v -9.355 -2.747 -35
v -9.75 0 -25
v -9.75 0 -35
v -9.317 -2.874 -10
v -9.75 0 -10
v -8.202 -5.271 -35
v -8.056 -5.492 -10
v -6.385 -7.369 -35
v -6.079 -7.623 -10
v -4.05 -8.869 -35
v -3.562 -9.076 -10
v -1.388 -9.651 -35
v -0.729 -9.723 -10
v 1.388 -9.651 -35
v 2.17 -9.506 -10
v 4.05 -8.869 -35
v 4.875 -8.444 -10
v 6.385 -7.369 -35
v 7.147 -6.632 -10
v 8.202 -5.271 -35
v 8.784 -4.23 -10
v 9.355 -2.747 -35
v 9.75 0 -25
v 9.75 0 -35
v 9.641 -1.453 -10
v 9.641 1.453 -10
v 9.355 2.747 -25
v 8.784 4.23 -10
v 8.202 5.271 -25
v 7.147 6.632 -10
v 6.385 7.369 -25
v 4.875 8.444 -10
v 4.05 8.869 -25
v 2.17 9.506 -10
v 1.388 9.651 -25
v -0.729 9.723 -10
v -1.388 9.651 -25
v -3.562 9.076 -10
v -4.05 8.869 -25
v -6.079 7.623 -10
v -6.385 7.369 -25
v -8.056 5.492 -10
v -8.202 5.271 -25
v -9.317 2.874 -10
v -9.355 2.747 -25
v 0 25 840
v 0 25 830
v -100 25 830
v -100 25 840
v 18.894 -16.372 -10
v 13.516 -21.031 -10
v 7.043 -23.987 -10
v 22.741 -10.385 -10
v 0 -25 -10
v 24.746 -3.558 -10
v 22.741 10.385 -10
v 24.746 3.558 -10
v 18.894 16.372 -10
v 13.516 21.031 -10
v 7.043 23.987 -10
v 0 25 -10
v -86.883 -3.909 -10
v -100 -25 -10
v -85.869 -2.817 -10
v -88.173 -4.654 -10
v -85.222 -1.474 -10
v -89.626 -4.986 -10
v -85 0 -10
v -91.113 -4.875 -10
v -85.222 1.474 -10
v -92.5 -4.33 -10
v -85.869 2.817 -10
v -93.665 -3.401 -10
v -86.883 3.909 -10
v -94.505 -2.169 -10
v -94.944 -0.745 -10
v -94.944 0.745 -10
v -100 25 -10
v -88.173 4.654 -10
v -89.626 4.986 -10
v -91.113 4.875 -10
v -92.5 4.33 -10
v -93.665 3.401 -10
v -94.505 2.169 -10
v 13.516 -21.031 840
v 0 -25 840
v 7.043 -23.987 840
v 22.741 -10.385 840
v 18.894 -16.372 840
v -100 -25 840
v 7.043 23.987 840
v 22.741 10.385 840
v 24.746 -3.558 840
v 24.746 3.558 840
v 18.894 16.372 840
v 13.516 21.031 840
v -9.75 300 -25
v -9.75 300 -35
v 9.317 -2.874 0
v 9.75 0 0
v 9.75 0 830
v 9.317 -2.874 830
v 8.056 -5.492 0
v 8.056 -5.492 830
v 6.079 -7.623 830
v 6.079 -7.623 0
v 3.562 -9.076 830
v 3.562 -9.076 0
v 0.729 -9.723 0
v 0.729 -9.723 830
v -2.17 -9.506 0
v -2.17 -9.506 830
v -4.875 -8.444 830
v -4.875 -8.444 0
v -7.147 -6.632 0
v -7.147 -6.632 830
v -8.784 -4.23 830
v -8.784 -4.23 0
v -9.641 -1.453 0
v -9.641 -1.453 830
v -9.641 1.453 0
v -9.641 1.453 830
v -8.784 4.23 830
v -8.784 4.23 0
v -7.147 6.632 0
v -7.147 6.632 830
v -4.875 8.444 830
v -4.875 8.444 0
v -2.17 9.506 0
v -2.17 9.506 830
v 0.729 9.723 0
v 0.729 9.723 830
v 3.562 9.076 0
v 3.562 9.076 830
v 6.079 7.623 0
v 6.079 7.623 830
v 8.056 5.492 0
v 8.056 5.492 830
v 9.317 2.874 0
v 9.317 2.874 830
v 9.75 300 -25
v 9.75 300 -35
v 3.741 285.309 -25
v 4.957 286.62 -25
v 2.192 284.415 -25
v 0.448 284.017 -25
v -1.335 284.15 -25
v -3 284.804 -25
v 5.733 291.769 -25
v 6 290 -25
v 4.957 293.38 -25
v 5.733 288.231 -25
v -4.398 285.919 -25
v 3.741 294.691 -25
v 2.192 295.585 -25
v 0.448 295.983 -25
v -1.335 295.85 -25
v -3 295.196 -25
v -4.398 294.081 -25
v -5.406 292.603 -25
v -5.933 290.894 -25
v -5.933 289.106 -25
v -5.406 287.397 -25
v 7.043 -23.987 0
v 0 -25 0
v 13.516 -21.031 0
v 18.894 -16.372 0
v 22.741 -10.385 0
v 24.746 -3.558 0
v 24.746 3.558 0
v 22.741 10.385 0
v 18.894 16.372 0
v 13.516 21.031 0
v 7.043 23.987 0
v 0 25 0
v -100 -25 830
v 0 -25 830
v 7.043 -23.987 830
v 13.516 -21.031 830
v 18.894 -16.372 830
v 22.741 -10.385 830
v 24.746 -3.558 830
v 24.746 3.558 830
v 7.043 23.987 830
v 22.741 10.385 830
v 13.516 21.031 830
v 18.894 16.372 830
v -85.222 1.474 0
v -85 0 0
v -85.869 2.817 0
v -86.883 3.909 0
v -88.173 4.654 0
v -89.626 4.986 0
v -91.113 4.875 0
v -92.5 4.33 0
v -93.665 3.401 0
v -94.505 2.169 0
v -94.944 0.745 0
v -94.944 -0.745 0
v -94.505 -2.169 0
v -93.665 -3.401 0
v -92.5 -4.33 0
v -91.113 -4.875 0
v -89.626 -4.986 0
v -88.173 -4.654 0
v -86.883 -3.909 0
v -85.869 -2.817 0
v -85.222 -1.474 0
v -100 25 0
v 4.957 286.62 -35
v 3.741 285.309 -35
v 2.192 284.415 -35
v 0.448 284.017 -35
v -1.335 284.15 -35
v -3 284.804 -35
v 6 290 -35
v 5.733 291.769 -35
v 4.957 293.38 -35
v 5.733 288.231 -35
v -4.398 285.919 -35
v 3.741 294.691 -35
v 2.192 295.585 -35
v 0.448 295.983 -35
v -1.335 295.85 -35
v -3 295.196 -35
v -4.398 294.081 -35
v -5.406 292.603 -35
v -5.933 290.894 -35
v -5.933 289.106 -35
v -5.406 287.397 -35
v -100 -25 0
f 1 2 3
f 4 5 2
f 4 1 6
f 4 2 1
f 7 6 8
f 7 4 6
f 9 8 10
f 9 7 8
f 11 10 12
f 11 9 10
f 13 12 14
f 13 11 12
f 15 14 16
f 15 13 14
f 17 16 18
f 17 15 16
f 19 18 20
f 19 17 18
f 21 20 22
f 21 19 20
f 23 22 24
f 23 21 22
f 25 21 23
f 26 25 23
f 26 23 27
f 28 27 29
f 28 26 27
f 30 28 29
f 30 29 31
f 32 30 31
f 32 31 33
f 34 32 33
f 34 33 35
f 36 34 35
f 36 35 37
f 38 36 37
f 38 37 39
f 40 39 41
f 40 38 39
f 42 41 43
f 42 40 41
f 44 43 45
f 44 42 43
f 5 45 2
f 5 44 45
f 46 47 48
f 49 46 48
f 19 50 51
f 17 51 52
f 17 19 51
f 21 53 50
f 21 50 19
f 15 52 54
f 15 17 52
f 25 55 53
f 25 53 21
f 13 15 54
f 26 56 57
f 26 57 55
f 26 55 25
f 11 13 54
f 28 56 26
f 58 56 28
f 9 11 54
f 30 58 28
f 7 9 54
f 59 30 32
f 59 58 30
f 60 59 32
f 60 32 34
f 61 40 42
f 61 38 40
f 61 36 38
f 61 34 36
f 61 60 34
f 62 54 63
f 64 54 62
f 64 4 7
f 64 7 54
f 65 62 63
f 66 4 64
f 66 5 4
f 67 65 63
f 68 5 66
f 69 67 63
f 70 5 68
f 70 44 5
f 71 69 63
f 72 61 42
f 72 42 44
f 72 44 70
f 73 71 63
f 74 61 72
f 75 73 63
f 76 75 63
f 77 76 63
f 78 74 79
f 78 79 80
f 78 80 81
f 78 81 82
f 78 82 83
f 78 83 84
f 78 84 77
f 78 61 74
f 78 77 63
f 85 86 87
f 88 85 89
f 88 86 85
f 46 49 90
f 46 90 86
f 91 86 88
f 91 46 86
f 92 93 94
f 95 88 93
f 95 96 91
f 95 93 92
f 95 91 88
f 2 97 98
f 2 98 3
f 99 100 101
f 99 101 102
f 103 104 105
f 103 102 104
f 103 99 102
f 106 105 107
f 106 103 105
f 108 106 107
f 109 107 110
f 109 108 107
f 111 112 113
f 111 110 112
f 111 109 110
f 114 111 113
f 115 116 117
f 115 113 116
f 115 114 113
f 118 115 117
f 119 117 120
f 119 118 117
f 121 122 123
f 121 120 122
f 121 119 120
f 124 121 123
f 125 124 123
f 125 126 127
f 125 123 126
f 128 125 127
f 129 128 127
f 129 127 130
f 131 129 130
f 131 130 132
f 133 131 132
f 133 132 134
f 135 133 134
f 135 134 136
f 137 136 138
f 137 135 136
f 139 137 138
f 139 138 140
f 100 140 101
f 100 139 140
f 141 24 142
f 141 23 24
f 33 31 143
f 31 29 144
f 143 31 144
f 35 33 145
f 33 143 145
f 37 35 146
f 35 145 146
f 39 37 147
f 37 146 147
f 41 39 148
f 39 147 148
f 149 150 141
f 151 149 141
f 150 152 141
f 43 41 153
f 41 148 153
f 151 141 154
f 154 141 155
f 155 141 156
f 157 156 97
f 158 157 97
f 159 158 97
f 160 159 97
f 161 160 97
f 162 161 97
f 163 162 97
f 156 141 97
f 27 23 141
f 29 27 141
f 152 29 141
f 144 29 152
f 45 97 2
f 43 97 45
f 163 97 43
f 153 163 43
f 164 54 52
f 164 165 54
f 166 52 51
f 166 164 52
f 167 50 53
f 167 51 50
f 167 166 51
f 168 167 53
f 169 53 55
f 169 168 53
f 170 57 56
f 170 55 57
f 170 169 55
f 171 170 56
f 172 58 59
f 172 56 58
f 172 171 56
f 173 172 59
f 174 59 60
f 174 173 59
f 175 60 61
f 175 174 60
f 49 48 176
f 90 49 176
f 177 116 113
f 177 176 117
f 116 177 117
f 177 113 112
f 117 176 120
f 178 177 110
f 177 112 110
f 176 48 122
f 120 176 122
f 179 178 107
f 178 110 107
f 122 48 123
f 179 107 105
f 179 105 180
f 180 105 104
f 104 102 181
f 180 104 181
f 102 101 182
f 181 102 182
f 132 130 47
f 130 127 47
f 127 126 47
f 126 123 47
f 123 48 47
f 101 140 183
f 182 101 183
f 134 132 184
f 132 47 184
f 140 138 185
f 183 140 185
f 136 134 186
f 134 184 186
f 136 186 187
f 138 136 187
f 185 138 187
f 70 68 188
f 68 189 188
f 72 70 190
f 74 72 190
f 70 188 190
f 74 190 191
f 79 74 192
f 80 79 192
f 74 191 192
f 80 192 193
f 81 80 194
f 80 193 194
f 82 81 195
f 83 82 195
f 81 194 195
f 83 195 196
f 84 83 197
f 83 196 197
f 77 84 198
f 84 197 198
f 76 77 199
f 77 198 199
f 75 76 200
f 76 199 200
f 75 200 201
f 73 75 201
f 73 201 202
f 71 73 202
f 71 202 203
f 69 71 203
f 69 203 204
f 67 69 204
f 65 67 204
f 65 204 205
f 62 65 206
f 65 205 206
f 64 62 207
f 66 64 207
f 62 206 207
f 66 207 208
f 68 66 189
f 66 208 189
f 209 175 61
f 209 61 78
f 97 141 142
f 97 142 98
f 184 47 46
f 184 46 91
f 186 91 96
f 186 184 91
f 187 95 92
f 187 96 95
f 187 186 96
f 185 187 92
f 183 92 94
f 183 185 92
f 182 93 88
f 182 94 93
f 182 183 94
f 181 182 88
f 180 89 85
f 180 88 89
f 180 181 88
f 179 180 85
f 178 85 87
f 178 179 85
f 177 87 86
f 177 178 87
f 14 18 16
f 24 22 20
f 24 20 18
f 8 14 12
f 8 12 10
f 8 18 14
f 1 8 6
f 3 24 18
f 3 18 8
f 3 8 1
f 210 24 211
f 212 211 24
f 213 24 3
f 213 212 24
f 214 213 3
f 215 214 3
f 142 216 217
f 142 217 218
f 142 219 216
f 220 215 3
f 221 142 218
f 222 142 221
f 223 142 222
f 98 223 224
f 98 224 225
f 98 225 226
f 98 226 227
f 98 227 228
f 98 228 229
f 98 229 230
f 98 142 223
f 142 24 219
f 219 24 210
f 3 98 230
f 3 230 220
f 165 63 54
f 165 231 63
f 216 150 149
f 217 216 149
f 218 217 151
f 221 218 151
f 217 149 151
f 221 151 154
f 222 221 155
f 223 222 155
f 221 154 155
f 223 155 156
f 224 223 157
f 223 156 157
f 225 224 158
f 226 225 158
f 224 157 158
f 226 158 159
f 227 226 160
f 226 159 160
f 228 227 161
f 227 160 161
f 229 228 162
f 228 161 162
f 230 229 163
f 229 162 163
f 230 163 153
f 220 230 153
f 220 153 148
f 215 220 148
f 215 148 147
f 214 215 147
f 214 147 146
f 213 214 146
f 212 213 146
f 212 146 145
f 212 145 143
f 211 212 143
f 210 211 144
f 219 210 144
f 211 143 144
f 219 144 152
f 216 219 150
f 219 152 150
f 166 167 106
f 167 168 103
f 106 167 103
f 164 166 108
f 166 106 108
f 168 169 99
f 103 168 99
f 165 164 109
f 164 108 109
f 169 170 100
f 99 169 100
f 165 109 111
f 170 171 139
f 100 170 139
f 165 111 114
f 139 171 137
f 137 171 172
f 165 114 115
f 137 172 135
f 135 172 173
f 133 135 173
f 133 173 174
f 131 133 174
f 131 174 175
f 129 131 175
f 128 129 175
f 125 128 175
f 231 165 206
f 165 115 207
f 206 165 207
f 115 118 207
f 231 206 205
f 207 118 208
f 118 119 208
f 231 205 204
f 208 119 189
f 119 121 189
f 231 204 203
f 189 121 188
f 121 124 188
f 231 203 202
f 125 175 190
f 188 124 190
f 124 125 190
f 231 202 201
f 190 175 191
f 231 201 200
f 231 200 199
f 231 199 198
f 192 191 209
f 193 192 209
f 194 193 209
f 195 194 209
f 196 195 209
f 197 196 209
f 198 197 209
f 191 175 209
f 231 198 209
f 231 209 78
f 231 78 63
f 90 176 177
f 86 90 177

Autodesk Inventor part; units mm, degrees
ref_plane "YZ Plane" through (0, 0, 0) normal (1, 0, 0) x (0, 1, 0)
ref_plane "XZ Plane" through (0, 0, 0) normal (0, 1, 0) x (-1, 0, 0)
ref_plane "XY Plane" through (0, 0, 0) normal (0, 0, 1) x (1, 0, 0)
sketch "Skizze1" plane through (0, 0, 0) normal (0, 0, 1) x (1, 0, 0)
  circle A0 centre (0, 0) radius 9.75
  dimension "d0" = 19.5
extrude "Extrusion1" add sketch "Skizze1" along normal blind 830
sketch "Skizze4" plane through (0, 0, 830) normal (0, 0, 1) x (1, 0, 0)
  arc A0 (0, -25) -> (0, 25) centre (0, 0) ccw
  line L0 (0, 0) -> (0, -25) construction
  line L1 (0, 0) -> (0, 27.5151) construction
  line L2 (0, 25) -> (-100, 25)
  line L3 (-100, 25) -> (-100, -25)
  line L4 (-100, -25) -> (0, -25)
  point P0 (0, 25)
  dimension "d9" = 180
  dimension "d10" = 100
  dimension "d11" = 50
  dimension "d12" = 25
extrude "Extrusion4" add sketch "Skizze4" along normal blind 10
sketch "Skizze5" plane through (0, 0, 0) normal (0, 0, -1) x (-1, 0, 0)
  arc A0 (0, 25) -> (0, -25) centre (0, 0) ccw
  line L0 (0, 25) -> (100, 25)
  line L1 (100, 25) -> (100, -25)
  line L2 (100, -25) -> (0, -25)
  dimension "d15" = 25
  dimension "d16" = 0
  dimension "d17" = 0
  dimension "d18" = 100
  dimension "d19" = 50
  dimension "d20" = 90
extrude "Extrusion5" add sketch "Skizze5" along normal blind 10
sketch "Skizze6" plane through (0, 0, 0) normal (0, 0, 1) x (1, 0, 0)
  circle A0 centre (-90, 0) radius 5
  line L0 (-100, 25) -> (0, 25) projected
  line L1 (-100, -25) -> (-100, 25) projected
  point P0 (0, 0)
  dimension "d23" = 10
  dimension "d24" = 25
  dimension "d25" = 10
extrude "Extrusion6" cut sketch "Skizze6" against normal up to surface (10 mm away)
sketch "Skizze7" plane through (0, 0, -10) normal (0, 0, -1) x (-1, 0, 0)
  circle A0 centre (0, 0) radius 9.75
  dimension "d28" = 19.5
extrude "Extrusion7" add sketch "Skizze7" along normal blind 15
sketch "Skizze8" plane through (0, 0, -25) normal (0, 0, -1) x (-1, 0, 0)
  line L0 (9.75, 0) -> (-9.75, 0)
  line L1 (-9.75, 0) -> (-9.75, 300)
  line L2 (-9.75, 300) -> (9.75, 300)
  line L3 (9.75, 300) -> (9.75, 0)
  circle A0 centre (0, 0) radius 9.75
  circle A1 centre (0, 0) radius 9.75
  dimension "d31" = 300
  dimension "d32" = 19.5
  dimension "d33" = 9.75
  dimension "d34" = 0
  dimension "d35" = 19.5
extrude "Extrusion8" add sketch "Skizze8" along normal blind 10
sketch "Skizze9" plane through (0, 0, -25) normal (0, 0, 1) x (1, 0, 0)
  circle A0 centre (0, 290) radius 6
  line L0 (9.75, 300) -> (9.75, 0) projected
  line L1 (-9.75, 300) -> (9.75, 300) projected
  point P0 (0, 0)
  dimension "d38" = 12
  dimension "d39" = 9.75
  dimension "d40" = 10
extrude "Extrusion9" cut sketch "Skizze9" against normal up to surface (10 mm away)
properties part number "LenkungHinten"
